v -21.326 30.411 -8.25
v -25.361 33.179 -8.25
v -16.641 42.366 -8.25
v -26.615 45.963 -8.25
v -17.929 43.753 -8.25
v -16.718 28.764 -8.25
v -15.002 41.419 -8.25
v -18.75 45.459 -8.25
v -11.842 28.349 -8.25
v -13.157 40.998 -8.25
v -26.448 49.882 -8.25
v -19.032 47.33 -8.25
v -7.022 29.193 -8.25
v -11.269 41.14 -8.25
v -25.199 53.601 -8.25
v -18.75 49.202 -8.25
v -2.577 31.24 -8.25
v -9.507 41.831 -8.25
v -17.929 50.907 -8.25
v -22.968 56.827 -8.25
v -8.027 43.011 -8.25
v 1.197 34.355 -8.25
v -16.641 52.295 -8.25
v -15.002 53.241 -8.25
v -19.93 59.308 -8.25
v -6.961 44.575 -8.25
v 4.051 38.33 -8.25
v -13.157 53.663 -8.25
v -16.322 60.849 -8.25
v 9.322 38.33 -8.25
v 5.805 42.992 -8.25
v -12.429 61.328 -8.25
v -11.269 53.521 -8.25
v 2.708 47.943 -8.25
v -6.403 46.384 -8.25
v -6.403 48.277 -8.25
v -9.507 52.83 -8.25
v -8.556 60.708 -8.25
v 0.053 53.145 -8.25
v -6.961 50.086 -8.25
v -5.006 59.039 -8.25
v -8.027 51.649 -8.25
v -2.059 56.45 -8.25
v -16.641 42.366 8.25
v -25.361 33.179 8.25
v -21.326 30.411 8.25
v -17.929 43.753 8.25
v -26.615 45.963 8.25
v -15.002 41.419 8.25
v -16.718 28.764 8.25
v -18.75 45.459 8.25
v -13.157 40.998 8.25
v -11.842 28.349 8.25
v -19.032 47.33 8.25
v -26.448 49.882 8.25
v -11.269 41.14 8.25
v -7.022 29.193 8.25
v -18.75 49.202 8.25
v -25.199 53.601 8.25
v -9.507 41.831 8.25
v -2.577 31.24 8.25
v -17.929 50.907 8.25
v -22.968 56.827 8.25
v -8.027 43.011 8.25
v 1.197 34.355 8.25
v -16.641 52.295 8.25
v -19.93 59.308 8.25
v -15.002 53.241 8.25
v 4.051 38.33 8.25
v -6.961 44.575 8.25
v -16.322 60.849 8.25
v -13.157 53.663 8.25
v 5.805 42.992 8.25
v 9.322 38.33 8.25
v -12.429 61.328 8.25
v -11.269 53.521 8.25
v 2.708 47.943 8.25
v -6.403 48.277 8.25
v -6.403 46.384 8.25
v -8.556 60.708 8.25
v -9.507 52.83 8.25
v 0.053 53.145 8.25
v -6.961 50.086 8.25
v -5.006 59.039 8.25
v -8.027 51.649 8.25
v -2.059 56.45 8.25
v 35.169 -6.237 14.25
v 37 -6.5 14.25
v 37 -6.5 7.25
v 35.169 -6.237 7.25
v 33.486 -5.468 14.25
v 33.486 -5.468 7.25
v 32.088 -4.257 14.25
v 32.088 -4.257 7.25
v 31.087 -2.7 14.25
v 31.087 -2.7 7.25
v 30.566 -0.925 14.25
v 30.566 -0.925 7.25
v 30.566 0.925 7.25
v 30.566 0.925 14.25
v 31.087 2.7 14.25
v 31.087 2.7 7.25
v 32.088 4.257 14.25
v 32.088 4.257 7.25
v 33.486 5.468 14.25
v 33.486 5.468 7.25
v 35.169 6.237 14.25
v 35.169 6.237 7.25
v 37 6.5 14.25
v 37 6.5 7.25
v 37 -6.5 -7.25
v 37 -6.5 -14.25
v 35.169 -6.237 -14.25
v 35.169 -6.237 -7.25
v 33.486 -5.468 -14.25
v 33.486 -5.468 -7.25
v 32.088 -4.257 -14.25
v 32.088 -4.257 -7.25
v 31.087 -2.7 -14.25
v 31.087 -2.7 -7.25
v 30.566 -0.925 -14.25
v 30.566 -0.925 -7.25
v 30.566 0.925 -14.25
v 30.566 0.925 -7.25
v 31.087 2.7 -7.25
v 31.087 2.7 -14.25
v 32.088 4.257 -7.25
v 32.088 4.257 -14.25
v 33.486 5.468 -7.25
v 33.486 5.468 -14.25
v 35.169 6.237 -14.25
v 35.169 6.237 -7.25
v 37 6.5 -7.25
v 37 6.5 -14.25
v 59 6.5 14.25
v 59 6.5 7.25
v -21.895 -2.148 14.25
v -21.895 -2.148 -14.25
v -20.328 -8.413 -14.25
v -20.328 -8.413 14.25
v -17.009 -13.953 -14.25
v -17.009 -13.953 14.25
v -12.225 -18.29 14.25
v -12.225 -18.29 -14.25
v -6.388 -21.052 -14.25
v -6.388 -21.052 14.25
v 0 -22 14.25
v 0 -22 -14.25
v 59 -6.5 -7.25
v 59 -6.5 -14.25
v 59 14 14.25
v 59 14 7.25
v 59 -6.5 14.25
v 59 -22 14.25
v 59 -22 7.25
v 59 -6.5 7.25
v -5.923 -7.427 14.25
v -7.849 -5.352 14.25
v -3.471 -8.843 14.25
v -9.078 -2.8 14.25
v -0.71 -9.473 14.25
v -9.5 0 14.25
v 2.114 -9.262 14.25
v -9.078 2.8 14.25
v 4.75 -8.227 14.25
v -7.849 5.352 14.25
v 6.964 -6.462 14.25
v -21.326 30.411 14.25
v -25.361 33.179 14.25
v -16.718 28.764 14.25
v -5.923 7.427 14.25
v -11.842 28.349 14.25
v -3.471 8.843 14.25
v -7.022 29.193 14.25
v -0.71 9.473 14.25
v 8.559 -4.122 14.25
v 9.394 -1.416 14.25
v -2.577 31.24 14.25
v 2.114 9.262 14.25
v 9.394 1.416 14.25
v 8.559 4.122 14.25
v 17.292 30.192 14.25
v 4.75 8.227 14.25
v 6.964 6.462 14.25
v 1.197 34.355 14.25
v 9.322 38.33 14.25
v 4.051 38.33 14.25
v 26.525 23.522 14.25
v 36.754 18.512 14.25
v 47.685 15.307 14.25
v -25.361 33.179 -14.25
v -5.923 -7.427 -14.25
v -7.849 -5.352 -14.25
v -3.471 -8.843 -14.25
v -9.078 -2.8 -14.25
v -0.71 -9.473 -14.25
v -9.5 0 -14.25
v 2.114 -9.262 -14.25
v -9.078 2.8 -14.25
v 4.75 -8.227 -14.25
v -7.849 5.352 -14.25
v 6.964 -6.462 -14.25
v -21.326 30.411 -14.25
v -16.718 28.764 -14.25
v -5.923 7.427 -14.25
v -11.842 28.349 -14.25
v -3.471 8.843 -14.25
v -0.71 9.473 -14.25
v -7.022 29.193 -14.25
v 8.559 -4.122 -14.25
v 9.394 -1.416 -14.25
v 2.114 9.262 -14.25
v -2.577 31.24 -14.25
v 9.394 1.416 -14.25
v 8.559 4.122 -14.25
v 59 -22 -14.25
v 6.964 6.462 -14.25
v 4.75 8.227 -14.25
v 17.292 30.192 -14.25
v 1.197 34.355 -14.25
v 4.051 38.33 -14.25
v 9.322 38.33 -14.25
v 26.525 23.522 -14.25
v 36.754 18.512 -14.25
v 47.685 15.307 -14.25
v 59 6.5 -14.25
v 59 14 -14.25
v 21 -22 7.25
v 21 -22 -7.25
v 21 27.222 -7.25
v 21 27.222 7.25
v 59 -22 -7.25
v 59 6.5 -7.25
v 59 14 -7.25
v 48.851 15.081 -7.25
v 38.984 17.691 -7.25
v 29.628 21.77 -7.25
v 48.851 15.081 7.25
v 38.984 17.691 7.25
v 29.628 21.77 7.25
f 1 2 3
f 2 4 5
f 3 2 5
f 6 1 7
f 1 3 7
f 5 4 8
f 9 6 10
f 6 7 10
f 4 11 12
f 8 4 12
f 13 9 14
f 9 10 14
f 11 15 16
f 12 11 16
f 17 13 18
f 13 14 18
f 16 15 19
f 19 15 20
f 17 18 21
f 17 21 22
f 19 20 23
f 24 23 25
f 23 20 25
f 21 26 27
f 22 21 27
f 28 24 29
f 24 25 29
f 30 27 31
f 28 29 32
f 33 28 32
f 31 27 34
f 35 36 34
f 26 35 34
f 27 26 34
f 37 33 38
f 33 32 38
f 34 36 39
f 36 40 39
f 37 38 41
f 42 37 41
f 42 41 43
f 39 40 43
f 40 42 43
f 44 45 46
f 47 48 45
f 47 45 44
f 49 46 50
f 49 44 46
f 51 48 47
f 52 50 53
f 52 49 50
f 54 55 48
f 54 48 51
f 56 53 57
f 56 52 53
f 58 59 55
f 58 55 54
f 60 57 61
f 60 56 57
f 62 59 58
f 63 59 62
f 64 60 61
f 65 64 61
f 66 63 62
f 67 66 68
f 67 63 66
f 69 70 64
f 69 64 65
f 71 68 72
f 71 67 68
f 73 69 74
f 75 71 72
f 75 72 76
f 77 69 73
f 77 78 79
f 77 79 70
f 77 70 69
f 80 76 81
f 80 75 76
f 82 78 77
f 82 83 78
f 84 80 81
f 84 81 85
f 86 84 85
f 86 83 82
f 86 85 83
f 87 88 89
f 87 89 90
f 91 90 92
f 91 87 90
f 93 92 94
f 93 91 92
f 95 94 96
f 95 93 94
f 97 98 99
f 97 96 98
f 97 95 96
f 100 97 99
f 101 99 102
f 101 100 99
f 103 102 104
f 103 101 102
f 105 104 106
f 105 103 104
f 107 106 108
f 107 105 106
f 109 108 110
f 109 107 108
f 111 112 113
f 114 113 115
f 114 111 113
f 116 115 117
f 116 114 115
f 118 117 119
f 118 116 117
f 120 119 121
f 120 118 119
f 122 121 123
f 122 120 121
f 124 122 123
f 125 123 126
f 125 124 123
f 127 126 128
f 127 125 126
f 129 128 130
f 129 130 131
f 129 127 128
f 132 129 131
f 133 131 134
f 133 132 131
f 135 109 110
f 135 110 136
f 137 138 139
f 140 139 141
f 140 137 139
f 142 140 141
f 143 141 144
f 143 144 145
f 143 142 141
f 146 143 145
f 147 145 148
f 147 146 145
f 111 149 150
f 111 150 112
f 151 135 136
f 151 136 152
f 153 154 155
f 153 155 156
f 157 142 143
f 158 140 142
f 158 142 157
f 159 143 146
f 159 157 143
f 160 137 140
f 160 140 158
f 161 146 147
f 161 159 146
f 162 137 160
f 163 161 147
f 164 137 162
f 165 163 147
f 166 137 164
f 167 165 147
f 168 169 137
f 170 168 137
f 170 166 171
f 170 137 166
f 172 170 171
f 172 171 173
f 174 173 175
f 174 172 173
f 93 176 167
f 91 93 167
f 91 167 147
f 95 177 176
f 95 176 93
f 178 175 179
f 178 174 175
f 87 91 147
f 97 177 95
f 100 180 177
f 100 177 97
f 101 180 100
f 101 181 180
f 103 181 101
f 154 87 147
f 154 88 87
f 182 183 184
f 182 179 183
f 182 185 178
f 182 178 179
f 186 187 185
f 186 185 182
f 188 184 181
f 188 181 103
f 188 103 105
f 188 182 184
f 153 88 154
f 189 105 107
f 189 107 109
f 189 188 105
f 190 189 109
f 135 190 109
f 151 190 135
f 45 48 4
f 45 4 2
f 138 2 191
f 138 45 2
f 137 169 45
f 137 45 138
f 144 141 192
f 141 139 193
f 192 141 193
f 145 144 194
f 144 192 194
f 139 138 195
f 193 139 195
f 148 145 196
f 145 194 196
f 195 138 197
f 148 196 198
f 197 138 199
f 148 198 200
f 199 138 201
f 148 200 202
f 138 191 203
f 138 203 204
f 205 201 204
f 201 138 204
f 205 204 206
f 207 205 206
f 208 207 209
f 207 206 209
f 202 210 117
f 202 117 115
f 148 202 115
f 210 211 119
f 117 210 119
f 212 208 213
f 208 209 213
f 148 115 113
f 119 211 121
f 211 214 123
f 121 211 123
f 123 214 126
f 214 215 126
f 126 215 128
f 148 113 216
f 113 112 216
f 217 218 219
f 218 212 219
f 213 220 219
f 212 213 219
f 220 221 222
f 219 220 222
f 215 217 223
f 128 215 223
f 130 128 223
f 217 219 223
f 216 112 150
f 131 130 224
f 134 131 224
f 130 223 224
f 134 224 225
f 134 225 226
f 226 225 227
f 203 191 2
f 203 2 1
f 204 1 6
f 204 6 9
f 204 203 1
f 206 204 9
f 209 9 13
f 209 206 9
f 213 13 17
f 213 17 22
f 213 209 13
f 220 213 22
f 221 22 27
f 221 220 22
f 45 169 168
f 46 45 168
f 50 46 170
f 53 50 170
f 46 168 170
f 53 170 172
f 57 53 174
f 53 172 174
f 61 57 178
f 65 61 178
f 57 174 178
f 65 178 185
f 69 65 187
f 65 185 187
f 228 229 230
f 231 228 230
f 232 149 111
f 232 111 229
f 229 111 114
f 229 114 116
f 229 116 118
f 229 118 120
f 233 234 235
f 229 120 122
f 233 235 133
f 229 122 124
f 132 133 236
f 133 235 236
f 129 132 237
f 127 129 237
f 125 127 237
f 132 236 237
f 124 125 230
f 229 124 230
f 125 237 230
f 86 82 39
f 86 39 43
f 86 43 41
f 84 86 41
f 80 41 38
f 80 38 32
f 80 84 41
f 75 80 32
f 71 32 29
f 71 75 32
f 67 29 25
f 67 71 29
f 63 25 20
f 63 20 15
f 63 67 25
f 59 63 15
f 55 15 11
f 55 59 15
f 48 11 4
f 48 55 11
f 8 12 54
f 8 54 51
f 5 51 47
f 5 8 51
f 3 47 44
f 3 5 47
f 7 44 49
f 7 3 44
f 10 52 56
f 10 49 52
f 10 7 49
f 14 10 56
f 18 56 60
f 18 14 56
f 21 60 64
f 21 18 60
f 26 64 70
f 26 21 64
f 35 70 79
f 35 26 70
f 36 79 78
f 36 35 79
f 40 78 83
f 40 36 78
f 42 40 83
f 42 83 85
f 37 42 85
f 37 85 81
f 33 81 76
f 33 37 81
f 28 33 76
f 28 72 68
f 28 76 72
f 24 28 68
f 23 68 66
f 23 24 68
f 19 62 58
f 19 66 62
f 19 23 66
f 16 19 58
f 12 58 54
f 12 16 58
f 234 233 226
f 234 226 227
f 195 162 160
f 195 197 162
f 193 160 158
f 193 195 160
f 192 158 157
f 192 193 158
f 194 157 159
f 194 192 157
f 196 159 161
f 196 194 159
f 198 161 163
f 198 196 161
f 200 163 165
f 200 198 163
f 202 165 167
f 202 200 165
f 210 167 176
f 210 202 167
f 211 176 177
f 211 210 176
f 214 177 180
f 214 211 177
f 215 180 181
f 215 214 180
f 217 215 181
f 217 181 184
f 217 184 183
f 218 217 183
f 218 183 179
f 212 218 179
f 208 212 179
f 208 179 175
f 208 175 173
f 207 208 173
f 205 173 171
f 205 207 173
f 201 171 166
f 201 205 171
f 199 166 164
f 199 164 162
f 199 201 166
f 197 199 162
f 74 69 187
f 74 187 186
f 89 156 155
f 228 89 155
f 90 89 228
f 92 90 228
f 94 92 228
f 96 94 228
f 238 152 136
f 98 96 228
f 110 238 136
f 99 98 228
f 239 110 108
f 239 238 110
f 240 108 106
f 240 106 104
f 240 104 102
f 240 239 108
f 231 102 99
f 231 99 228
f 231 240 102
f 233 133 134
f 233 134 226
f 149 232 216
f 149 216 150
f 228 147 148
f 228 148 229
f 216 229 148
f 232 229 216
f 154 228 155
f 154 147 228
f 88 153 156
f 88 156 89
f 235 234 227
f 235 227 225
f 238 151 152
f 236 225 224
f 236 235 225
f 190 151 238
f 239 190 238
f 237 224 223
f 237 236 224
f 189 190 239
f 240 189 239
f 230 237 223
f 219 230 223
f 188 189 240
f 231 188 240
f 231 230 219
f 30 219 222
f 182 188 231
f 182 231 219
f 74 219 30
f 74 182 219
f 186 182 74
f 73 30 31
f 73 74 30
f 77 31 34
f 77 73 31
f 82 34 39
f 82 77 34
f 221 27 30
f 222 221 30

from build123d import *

# Parameters (mm, degrees)
ESQUISSE1_R                  = 9.5
ESQUISSE1_R_2                = 6.35
BOSS_EXTRU_1_DEPTH           = 14.25
ENL_V_MAT_EXTRU_1_DEPTH      = 6
ENL_V_MAT_EXTRU_2_DEPTH      = 7.25
ENL_V_MAT_EXTRU_2_DEPTH_BACK = 7.25


with BuildPart() as part:
    # Esquisse1 → Boss.-Extru.1 (new, symmetric)
    with BuildSketch(Plane.XY):
        with BuildLine():
            Line((-26.61523279, 45.963348263), (-21.894870769, -2.148169925))
            ThreePointArc((-21.894870769, -2.148169925), (-14.777351956, -16.298155392), (0, -22))
            Line((0, -22), (59, -22))
            Line((59, -22), (59, -6.5))
            Line((59, -6.5), (37, -6.5))
            ThreePointArc((37, -6.5), (30.5, 0), (37, 6.5))
            Line((37, 6.5), (59, 6.5))
            Line((59, 6.5), (59, 14))
            ThreePointArc((59, 14), (23.937620364, 25.155899787), (0.053417306, 53.144636986))
            ThreePointArc((0.053417306, 53.144636986), (-16.322360933, 60.848824799), (-26.61523279, 45.963348263))
        make_face()
        with Locations(Location((0, 0, 0), (0, 0, 180))):
            Circle(ESQUISSE1_R, mode=Mode.SUBTRACT)
        with Locations(Location((-12.68213321, 47.330365488, 0), (0, 0, 180))):
            Circle(ESQUISSE1_R_2, mode=Mode.SUBTRACT)
    extrude(amount=BOSS_EXTRU_1_DEPTH, both=True)

    # Esquisse2 → Enlèv. mat.-Extru.1 (cut)
    with BuildSketch(Plane.XY.offset(14.25)):
        with BuildLine():
            Line((4.051067321, 38.330365488), (9.321809703, 38.330365488))
            ThreePointArc((9.321809703, 38.330365488), (4.202566317, 45.434036591), (0.053417306, 53.144636986))
            ThreePointArc((0.053417306, 53.144636986), (-16.322360933, 60.848824799), (-26.61523279, 45.963348263))
            Line((-26.61523279, 45.963348263), (-25.360971776, 33.179497931))
            ThreePointArc((-25.360971776, 33.179497931), (-9.404585059, 28.615193084), (4.051067321, 38.330365488))
        make_face()
    enl_v_mat_extru_1 = extrude(amount=-ENL_V_MAT_EXTRU_1_DEPTH, mode=Mode.SUBTRACT)

    # Symétrie1: Enlèv. mat.-Extru.1 across plane
    add(enl_v_mat_extru_1.mirror(Plane.XY), mode=Mode.SUBTRACT)

    # Esquisse3 → Enlèv. mat.-Extru.2 (cut, two sides: drawn at the far end of the back side and taken through both)
    with BuildSketch(Plane.XY.offset(-ENL_V_MAT_EXTRU_2_DEPTH_BACK)):
        with BuildLine():
            Line((21, -22), (21, 27.222240802))
            ThreePointArc((21, 27.222240802), (38.984037644, 17.691299917), (59, 14))
            Line((59, 14), (59, -22))
            Line((59, -22), (21, -22))
        make_face()
    extrude(amount=ENL_V_MAT_EXTRU_2_DEPTH + ENL_V_MAT_EXTRU_2_DEPTH_BACK, mode=Mode.SUBTRACT)


solid = part.part
